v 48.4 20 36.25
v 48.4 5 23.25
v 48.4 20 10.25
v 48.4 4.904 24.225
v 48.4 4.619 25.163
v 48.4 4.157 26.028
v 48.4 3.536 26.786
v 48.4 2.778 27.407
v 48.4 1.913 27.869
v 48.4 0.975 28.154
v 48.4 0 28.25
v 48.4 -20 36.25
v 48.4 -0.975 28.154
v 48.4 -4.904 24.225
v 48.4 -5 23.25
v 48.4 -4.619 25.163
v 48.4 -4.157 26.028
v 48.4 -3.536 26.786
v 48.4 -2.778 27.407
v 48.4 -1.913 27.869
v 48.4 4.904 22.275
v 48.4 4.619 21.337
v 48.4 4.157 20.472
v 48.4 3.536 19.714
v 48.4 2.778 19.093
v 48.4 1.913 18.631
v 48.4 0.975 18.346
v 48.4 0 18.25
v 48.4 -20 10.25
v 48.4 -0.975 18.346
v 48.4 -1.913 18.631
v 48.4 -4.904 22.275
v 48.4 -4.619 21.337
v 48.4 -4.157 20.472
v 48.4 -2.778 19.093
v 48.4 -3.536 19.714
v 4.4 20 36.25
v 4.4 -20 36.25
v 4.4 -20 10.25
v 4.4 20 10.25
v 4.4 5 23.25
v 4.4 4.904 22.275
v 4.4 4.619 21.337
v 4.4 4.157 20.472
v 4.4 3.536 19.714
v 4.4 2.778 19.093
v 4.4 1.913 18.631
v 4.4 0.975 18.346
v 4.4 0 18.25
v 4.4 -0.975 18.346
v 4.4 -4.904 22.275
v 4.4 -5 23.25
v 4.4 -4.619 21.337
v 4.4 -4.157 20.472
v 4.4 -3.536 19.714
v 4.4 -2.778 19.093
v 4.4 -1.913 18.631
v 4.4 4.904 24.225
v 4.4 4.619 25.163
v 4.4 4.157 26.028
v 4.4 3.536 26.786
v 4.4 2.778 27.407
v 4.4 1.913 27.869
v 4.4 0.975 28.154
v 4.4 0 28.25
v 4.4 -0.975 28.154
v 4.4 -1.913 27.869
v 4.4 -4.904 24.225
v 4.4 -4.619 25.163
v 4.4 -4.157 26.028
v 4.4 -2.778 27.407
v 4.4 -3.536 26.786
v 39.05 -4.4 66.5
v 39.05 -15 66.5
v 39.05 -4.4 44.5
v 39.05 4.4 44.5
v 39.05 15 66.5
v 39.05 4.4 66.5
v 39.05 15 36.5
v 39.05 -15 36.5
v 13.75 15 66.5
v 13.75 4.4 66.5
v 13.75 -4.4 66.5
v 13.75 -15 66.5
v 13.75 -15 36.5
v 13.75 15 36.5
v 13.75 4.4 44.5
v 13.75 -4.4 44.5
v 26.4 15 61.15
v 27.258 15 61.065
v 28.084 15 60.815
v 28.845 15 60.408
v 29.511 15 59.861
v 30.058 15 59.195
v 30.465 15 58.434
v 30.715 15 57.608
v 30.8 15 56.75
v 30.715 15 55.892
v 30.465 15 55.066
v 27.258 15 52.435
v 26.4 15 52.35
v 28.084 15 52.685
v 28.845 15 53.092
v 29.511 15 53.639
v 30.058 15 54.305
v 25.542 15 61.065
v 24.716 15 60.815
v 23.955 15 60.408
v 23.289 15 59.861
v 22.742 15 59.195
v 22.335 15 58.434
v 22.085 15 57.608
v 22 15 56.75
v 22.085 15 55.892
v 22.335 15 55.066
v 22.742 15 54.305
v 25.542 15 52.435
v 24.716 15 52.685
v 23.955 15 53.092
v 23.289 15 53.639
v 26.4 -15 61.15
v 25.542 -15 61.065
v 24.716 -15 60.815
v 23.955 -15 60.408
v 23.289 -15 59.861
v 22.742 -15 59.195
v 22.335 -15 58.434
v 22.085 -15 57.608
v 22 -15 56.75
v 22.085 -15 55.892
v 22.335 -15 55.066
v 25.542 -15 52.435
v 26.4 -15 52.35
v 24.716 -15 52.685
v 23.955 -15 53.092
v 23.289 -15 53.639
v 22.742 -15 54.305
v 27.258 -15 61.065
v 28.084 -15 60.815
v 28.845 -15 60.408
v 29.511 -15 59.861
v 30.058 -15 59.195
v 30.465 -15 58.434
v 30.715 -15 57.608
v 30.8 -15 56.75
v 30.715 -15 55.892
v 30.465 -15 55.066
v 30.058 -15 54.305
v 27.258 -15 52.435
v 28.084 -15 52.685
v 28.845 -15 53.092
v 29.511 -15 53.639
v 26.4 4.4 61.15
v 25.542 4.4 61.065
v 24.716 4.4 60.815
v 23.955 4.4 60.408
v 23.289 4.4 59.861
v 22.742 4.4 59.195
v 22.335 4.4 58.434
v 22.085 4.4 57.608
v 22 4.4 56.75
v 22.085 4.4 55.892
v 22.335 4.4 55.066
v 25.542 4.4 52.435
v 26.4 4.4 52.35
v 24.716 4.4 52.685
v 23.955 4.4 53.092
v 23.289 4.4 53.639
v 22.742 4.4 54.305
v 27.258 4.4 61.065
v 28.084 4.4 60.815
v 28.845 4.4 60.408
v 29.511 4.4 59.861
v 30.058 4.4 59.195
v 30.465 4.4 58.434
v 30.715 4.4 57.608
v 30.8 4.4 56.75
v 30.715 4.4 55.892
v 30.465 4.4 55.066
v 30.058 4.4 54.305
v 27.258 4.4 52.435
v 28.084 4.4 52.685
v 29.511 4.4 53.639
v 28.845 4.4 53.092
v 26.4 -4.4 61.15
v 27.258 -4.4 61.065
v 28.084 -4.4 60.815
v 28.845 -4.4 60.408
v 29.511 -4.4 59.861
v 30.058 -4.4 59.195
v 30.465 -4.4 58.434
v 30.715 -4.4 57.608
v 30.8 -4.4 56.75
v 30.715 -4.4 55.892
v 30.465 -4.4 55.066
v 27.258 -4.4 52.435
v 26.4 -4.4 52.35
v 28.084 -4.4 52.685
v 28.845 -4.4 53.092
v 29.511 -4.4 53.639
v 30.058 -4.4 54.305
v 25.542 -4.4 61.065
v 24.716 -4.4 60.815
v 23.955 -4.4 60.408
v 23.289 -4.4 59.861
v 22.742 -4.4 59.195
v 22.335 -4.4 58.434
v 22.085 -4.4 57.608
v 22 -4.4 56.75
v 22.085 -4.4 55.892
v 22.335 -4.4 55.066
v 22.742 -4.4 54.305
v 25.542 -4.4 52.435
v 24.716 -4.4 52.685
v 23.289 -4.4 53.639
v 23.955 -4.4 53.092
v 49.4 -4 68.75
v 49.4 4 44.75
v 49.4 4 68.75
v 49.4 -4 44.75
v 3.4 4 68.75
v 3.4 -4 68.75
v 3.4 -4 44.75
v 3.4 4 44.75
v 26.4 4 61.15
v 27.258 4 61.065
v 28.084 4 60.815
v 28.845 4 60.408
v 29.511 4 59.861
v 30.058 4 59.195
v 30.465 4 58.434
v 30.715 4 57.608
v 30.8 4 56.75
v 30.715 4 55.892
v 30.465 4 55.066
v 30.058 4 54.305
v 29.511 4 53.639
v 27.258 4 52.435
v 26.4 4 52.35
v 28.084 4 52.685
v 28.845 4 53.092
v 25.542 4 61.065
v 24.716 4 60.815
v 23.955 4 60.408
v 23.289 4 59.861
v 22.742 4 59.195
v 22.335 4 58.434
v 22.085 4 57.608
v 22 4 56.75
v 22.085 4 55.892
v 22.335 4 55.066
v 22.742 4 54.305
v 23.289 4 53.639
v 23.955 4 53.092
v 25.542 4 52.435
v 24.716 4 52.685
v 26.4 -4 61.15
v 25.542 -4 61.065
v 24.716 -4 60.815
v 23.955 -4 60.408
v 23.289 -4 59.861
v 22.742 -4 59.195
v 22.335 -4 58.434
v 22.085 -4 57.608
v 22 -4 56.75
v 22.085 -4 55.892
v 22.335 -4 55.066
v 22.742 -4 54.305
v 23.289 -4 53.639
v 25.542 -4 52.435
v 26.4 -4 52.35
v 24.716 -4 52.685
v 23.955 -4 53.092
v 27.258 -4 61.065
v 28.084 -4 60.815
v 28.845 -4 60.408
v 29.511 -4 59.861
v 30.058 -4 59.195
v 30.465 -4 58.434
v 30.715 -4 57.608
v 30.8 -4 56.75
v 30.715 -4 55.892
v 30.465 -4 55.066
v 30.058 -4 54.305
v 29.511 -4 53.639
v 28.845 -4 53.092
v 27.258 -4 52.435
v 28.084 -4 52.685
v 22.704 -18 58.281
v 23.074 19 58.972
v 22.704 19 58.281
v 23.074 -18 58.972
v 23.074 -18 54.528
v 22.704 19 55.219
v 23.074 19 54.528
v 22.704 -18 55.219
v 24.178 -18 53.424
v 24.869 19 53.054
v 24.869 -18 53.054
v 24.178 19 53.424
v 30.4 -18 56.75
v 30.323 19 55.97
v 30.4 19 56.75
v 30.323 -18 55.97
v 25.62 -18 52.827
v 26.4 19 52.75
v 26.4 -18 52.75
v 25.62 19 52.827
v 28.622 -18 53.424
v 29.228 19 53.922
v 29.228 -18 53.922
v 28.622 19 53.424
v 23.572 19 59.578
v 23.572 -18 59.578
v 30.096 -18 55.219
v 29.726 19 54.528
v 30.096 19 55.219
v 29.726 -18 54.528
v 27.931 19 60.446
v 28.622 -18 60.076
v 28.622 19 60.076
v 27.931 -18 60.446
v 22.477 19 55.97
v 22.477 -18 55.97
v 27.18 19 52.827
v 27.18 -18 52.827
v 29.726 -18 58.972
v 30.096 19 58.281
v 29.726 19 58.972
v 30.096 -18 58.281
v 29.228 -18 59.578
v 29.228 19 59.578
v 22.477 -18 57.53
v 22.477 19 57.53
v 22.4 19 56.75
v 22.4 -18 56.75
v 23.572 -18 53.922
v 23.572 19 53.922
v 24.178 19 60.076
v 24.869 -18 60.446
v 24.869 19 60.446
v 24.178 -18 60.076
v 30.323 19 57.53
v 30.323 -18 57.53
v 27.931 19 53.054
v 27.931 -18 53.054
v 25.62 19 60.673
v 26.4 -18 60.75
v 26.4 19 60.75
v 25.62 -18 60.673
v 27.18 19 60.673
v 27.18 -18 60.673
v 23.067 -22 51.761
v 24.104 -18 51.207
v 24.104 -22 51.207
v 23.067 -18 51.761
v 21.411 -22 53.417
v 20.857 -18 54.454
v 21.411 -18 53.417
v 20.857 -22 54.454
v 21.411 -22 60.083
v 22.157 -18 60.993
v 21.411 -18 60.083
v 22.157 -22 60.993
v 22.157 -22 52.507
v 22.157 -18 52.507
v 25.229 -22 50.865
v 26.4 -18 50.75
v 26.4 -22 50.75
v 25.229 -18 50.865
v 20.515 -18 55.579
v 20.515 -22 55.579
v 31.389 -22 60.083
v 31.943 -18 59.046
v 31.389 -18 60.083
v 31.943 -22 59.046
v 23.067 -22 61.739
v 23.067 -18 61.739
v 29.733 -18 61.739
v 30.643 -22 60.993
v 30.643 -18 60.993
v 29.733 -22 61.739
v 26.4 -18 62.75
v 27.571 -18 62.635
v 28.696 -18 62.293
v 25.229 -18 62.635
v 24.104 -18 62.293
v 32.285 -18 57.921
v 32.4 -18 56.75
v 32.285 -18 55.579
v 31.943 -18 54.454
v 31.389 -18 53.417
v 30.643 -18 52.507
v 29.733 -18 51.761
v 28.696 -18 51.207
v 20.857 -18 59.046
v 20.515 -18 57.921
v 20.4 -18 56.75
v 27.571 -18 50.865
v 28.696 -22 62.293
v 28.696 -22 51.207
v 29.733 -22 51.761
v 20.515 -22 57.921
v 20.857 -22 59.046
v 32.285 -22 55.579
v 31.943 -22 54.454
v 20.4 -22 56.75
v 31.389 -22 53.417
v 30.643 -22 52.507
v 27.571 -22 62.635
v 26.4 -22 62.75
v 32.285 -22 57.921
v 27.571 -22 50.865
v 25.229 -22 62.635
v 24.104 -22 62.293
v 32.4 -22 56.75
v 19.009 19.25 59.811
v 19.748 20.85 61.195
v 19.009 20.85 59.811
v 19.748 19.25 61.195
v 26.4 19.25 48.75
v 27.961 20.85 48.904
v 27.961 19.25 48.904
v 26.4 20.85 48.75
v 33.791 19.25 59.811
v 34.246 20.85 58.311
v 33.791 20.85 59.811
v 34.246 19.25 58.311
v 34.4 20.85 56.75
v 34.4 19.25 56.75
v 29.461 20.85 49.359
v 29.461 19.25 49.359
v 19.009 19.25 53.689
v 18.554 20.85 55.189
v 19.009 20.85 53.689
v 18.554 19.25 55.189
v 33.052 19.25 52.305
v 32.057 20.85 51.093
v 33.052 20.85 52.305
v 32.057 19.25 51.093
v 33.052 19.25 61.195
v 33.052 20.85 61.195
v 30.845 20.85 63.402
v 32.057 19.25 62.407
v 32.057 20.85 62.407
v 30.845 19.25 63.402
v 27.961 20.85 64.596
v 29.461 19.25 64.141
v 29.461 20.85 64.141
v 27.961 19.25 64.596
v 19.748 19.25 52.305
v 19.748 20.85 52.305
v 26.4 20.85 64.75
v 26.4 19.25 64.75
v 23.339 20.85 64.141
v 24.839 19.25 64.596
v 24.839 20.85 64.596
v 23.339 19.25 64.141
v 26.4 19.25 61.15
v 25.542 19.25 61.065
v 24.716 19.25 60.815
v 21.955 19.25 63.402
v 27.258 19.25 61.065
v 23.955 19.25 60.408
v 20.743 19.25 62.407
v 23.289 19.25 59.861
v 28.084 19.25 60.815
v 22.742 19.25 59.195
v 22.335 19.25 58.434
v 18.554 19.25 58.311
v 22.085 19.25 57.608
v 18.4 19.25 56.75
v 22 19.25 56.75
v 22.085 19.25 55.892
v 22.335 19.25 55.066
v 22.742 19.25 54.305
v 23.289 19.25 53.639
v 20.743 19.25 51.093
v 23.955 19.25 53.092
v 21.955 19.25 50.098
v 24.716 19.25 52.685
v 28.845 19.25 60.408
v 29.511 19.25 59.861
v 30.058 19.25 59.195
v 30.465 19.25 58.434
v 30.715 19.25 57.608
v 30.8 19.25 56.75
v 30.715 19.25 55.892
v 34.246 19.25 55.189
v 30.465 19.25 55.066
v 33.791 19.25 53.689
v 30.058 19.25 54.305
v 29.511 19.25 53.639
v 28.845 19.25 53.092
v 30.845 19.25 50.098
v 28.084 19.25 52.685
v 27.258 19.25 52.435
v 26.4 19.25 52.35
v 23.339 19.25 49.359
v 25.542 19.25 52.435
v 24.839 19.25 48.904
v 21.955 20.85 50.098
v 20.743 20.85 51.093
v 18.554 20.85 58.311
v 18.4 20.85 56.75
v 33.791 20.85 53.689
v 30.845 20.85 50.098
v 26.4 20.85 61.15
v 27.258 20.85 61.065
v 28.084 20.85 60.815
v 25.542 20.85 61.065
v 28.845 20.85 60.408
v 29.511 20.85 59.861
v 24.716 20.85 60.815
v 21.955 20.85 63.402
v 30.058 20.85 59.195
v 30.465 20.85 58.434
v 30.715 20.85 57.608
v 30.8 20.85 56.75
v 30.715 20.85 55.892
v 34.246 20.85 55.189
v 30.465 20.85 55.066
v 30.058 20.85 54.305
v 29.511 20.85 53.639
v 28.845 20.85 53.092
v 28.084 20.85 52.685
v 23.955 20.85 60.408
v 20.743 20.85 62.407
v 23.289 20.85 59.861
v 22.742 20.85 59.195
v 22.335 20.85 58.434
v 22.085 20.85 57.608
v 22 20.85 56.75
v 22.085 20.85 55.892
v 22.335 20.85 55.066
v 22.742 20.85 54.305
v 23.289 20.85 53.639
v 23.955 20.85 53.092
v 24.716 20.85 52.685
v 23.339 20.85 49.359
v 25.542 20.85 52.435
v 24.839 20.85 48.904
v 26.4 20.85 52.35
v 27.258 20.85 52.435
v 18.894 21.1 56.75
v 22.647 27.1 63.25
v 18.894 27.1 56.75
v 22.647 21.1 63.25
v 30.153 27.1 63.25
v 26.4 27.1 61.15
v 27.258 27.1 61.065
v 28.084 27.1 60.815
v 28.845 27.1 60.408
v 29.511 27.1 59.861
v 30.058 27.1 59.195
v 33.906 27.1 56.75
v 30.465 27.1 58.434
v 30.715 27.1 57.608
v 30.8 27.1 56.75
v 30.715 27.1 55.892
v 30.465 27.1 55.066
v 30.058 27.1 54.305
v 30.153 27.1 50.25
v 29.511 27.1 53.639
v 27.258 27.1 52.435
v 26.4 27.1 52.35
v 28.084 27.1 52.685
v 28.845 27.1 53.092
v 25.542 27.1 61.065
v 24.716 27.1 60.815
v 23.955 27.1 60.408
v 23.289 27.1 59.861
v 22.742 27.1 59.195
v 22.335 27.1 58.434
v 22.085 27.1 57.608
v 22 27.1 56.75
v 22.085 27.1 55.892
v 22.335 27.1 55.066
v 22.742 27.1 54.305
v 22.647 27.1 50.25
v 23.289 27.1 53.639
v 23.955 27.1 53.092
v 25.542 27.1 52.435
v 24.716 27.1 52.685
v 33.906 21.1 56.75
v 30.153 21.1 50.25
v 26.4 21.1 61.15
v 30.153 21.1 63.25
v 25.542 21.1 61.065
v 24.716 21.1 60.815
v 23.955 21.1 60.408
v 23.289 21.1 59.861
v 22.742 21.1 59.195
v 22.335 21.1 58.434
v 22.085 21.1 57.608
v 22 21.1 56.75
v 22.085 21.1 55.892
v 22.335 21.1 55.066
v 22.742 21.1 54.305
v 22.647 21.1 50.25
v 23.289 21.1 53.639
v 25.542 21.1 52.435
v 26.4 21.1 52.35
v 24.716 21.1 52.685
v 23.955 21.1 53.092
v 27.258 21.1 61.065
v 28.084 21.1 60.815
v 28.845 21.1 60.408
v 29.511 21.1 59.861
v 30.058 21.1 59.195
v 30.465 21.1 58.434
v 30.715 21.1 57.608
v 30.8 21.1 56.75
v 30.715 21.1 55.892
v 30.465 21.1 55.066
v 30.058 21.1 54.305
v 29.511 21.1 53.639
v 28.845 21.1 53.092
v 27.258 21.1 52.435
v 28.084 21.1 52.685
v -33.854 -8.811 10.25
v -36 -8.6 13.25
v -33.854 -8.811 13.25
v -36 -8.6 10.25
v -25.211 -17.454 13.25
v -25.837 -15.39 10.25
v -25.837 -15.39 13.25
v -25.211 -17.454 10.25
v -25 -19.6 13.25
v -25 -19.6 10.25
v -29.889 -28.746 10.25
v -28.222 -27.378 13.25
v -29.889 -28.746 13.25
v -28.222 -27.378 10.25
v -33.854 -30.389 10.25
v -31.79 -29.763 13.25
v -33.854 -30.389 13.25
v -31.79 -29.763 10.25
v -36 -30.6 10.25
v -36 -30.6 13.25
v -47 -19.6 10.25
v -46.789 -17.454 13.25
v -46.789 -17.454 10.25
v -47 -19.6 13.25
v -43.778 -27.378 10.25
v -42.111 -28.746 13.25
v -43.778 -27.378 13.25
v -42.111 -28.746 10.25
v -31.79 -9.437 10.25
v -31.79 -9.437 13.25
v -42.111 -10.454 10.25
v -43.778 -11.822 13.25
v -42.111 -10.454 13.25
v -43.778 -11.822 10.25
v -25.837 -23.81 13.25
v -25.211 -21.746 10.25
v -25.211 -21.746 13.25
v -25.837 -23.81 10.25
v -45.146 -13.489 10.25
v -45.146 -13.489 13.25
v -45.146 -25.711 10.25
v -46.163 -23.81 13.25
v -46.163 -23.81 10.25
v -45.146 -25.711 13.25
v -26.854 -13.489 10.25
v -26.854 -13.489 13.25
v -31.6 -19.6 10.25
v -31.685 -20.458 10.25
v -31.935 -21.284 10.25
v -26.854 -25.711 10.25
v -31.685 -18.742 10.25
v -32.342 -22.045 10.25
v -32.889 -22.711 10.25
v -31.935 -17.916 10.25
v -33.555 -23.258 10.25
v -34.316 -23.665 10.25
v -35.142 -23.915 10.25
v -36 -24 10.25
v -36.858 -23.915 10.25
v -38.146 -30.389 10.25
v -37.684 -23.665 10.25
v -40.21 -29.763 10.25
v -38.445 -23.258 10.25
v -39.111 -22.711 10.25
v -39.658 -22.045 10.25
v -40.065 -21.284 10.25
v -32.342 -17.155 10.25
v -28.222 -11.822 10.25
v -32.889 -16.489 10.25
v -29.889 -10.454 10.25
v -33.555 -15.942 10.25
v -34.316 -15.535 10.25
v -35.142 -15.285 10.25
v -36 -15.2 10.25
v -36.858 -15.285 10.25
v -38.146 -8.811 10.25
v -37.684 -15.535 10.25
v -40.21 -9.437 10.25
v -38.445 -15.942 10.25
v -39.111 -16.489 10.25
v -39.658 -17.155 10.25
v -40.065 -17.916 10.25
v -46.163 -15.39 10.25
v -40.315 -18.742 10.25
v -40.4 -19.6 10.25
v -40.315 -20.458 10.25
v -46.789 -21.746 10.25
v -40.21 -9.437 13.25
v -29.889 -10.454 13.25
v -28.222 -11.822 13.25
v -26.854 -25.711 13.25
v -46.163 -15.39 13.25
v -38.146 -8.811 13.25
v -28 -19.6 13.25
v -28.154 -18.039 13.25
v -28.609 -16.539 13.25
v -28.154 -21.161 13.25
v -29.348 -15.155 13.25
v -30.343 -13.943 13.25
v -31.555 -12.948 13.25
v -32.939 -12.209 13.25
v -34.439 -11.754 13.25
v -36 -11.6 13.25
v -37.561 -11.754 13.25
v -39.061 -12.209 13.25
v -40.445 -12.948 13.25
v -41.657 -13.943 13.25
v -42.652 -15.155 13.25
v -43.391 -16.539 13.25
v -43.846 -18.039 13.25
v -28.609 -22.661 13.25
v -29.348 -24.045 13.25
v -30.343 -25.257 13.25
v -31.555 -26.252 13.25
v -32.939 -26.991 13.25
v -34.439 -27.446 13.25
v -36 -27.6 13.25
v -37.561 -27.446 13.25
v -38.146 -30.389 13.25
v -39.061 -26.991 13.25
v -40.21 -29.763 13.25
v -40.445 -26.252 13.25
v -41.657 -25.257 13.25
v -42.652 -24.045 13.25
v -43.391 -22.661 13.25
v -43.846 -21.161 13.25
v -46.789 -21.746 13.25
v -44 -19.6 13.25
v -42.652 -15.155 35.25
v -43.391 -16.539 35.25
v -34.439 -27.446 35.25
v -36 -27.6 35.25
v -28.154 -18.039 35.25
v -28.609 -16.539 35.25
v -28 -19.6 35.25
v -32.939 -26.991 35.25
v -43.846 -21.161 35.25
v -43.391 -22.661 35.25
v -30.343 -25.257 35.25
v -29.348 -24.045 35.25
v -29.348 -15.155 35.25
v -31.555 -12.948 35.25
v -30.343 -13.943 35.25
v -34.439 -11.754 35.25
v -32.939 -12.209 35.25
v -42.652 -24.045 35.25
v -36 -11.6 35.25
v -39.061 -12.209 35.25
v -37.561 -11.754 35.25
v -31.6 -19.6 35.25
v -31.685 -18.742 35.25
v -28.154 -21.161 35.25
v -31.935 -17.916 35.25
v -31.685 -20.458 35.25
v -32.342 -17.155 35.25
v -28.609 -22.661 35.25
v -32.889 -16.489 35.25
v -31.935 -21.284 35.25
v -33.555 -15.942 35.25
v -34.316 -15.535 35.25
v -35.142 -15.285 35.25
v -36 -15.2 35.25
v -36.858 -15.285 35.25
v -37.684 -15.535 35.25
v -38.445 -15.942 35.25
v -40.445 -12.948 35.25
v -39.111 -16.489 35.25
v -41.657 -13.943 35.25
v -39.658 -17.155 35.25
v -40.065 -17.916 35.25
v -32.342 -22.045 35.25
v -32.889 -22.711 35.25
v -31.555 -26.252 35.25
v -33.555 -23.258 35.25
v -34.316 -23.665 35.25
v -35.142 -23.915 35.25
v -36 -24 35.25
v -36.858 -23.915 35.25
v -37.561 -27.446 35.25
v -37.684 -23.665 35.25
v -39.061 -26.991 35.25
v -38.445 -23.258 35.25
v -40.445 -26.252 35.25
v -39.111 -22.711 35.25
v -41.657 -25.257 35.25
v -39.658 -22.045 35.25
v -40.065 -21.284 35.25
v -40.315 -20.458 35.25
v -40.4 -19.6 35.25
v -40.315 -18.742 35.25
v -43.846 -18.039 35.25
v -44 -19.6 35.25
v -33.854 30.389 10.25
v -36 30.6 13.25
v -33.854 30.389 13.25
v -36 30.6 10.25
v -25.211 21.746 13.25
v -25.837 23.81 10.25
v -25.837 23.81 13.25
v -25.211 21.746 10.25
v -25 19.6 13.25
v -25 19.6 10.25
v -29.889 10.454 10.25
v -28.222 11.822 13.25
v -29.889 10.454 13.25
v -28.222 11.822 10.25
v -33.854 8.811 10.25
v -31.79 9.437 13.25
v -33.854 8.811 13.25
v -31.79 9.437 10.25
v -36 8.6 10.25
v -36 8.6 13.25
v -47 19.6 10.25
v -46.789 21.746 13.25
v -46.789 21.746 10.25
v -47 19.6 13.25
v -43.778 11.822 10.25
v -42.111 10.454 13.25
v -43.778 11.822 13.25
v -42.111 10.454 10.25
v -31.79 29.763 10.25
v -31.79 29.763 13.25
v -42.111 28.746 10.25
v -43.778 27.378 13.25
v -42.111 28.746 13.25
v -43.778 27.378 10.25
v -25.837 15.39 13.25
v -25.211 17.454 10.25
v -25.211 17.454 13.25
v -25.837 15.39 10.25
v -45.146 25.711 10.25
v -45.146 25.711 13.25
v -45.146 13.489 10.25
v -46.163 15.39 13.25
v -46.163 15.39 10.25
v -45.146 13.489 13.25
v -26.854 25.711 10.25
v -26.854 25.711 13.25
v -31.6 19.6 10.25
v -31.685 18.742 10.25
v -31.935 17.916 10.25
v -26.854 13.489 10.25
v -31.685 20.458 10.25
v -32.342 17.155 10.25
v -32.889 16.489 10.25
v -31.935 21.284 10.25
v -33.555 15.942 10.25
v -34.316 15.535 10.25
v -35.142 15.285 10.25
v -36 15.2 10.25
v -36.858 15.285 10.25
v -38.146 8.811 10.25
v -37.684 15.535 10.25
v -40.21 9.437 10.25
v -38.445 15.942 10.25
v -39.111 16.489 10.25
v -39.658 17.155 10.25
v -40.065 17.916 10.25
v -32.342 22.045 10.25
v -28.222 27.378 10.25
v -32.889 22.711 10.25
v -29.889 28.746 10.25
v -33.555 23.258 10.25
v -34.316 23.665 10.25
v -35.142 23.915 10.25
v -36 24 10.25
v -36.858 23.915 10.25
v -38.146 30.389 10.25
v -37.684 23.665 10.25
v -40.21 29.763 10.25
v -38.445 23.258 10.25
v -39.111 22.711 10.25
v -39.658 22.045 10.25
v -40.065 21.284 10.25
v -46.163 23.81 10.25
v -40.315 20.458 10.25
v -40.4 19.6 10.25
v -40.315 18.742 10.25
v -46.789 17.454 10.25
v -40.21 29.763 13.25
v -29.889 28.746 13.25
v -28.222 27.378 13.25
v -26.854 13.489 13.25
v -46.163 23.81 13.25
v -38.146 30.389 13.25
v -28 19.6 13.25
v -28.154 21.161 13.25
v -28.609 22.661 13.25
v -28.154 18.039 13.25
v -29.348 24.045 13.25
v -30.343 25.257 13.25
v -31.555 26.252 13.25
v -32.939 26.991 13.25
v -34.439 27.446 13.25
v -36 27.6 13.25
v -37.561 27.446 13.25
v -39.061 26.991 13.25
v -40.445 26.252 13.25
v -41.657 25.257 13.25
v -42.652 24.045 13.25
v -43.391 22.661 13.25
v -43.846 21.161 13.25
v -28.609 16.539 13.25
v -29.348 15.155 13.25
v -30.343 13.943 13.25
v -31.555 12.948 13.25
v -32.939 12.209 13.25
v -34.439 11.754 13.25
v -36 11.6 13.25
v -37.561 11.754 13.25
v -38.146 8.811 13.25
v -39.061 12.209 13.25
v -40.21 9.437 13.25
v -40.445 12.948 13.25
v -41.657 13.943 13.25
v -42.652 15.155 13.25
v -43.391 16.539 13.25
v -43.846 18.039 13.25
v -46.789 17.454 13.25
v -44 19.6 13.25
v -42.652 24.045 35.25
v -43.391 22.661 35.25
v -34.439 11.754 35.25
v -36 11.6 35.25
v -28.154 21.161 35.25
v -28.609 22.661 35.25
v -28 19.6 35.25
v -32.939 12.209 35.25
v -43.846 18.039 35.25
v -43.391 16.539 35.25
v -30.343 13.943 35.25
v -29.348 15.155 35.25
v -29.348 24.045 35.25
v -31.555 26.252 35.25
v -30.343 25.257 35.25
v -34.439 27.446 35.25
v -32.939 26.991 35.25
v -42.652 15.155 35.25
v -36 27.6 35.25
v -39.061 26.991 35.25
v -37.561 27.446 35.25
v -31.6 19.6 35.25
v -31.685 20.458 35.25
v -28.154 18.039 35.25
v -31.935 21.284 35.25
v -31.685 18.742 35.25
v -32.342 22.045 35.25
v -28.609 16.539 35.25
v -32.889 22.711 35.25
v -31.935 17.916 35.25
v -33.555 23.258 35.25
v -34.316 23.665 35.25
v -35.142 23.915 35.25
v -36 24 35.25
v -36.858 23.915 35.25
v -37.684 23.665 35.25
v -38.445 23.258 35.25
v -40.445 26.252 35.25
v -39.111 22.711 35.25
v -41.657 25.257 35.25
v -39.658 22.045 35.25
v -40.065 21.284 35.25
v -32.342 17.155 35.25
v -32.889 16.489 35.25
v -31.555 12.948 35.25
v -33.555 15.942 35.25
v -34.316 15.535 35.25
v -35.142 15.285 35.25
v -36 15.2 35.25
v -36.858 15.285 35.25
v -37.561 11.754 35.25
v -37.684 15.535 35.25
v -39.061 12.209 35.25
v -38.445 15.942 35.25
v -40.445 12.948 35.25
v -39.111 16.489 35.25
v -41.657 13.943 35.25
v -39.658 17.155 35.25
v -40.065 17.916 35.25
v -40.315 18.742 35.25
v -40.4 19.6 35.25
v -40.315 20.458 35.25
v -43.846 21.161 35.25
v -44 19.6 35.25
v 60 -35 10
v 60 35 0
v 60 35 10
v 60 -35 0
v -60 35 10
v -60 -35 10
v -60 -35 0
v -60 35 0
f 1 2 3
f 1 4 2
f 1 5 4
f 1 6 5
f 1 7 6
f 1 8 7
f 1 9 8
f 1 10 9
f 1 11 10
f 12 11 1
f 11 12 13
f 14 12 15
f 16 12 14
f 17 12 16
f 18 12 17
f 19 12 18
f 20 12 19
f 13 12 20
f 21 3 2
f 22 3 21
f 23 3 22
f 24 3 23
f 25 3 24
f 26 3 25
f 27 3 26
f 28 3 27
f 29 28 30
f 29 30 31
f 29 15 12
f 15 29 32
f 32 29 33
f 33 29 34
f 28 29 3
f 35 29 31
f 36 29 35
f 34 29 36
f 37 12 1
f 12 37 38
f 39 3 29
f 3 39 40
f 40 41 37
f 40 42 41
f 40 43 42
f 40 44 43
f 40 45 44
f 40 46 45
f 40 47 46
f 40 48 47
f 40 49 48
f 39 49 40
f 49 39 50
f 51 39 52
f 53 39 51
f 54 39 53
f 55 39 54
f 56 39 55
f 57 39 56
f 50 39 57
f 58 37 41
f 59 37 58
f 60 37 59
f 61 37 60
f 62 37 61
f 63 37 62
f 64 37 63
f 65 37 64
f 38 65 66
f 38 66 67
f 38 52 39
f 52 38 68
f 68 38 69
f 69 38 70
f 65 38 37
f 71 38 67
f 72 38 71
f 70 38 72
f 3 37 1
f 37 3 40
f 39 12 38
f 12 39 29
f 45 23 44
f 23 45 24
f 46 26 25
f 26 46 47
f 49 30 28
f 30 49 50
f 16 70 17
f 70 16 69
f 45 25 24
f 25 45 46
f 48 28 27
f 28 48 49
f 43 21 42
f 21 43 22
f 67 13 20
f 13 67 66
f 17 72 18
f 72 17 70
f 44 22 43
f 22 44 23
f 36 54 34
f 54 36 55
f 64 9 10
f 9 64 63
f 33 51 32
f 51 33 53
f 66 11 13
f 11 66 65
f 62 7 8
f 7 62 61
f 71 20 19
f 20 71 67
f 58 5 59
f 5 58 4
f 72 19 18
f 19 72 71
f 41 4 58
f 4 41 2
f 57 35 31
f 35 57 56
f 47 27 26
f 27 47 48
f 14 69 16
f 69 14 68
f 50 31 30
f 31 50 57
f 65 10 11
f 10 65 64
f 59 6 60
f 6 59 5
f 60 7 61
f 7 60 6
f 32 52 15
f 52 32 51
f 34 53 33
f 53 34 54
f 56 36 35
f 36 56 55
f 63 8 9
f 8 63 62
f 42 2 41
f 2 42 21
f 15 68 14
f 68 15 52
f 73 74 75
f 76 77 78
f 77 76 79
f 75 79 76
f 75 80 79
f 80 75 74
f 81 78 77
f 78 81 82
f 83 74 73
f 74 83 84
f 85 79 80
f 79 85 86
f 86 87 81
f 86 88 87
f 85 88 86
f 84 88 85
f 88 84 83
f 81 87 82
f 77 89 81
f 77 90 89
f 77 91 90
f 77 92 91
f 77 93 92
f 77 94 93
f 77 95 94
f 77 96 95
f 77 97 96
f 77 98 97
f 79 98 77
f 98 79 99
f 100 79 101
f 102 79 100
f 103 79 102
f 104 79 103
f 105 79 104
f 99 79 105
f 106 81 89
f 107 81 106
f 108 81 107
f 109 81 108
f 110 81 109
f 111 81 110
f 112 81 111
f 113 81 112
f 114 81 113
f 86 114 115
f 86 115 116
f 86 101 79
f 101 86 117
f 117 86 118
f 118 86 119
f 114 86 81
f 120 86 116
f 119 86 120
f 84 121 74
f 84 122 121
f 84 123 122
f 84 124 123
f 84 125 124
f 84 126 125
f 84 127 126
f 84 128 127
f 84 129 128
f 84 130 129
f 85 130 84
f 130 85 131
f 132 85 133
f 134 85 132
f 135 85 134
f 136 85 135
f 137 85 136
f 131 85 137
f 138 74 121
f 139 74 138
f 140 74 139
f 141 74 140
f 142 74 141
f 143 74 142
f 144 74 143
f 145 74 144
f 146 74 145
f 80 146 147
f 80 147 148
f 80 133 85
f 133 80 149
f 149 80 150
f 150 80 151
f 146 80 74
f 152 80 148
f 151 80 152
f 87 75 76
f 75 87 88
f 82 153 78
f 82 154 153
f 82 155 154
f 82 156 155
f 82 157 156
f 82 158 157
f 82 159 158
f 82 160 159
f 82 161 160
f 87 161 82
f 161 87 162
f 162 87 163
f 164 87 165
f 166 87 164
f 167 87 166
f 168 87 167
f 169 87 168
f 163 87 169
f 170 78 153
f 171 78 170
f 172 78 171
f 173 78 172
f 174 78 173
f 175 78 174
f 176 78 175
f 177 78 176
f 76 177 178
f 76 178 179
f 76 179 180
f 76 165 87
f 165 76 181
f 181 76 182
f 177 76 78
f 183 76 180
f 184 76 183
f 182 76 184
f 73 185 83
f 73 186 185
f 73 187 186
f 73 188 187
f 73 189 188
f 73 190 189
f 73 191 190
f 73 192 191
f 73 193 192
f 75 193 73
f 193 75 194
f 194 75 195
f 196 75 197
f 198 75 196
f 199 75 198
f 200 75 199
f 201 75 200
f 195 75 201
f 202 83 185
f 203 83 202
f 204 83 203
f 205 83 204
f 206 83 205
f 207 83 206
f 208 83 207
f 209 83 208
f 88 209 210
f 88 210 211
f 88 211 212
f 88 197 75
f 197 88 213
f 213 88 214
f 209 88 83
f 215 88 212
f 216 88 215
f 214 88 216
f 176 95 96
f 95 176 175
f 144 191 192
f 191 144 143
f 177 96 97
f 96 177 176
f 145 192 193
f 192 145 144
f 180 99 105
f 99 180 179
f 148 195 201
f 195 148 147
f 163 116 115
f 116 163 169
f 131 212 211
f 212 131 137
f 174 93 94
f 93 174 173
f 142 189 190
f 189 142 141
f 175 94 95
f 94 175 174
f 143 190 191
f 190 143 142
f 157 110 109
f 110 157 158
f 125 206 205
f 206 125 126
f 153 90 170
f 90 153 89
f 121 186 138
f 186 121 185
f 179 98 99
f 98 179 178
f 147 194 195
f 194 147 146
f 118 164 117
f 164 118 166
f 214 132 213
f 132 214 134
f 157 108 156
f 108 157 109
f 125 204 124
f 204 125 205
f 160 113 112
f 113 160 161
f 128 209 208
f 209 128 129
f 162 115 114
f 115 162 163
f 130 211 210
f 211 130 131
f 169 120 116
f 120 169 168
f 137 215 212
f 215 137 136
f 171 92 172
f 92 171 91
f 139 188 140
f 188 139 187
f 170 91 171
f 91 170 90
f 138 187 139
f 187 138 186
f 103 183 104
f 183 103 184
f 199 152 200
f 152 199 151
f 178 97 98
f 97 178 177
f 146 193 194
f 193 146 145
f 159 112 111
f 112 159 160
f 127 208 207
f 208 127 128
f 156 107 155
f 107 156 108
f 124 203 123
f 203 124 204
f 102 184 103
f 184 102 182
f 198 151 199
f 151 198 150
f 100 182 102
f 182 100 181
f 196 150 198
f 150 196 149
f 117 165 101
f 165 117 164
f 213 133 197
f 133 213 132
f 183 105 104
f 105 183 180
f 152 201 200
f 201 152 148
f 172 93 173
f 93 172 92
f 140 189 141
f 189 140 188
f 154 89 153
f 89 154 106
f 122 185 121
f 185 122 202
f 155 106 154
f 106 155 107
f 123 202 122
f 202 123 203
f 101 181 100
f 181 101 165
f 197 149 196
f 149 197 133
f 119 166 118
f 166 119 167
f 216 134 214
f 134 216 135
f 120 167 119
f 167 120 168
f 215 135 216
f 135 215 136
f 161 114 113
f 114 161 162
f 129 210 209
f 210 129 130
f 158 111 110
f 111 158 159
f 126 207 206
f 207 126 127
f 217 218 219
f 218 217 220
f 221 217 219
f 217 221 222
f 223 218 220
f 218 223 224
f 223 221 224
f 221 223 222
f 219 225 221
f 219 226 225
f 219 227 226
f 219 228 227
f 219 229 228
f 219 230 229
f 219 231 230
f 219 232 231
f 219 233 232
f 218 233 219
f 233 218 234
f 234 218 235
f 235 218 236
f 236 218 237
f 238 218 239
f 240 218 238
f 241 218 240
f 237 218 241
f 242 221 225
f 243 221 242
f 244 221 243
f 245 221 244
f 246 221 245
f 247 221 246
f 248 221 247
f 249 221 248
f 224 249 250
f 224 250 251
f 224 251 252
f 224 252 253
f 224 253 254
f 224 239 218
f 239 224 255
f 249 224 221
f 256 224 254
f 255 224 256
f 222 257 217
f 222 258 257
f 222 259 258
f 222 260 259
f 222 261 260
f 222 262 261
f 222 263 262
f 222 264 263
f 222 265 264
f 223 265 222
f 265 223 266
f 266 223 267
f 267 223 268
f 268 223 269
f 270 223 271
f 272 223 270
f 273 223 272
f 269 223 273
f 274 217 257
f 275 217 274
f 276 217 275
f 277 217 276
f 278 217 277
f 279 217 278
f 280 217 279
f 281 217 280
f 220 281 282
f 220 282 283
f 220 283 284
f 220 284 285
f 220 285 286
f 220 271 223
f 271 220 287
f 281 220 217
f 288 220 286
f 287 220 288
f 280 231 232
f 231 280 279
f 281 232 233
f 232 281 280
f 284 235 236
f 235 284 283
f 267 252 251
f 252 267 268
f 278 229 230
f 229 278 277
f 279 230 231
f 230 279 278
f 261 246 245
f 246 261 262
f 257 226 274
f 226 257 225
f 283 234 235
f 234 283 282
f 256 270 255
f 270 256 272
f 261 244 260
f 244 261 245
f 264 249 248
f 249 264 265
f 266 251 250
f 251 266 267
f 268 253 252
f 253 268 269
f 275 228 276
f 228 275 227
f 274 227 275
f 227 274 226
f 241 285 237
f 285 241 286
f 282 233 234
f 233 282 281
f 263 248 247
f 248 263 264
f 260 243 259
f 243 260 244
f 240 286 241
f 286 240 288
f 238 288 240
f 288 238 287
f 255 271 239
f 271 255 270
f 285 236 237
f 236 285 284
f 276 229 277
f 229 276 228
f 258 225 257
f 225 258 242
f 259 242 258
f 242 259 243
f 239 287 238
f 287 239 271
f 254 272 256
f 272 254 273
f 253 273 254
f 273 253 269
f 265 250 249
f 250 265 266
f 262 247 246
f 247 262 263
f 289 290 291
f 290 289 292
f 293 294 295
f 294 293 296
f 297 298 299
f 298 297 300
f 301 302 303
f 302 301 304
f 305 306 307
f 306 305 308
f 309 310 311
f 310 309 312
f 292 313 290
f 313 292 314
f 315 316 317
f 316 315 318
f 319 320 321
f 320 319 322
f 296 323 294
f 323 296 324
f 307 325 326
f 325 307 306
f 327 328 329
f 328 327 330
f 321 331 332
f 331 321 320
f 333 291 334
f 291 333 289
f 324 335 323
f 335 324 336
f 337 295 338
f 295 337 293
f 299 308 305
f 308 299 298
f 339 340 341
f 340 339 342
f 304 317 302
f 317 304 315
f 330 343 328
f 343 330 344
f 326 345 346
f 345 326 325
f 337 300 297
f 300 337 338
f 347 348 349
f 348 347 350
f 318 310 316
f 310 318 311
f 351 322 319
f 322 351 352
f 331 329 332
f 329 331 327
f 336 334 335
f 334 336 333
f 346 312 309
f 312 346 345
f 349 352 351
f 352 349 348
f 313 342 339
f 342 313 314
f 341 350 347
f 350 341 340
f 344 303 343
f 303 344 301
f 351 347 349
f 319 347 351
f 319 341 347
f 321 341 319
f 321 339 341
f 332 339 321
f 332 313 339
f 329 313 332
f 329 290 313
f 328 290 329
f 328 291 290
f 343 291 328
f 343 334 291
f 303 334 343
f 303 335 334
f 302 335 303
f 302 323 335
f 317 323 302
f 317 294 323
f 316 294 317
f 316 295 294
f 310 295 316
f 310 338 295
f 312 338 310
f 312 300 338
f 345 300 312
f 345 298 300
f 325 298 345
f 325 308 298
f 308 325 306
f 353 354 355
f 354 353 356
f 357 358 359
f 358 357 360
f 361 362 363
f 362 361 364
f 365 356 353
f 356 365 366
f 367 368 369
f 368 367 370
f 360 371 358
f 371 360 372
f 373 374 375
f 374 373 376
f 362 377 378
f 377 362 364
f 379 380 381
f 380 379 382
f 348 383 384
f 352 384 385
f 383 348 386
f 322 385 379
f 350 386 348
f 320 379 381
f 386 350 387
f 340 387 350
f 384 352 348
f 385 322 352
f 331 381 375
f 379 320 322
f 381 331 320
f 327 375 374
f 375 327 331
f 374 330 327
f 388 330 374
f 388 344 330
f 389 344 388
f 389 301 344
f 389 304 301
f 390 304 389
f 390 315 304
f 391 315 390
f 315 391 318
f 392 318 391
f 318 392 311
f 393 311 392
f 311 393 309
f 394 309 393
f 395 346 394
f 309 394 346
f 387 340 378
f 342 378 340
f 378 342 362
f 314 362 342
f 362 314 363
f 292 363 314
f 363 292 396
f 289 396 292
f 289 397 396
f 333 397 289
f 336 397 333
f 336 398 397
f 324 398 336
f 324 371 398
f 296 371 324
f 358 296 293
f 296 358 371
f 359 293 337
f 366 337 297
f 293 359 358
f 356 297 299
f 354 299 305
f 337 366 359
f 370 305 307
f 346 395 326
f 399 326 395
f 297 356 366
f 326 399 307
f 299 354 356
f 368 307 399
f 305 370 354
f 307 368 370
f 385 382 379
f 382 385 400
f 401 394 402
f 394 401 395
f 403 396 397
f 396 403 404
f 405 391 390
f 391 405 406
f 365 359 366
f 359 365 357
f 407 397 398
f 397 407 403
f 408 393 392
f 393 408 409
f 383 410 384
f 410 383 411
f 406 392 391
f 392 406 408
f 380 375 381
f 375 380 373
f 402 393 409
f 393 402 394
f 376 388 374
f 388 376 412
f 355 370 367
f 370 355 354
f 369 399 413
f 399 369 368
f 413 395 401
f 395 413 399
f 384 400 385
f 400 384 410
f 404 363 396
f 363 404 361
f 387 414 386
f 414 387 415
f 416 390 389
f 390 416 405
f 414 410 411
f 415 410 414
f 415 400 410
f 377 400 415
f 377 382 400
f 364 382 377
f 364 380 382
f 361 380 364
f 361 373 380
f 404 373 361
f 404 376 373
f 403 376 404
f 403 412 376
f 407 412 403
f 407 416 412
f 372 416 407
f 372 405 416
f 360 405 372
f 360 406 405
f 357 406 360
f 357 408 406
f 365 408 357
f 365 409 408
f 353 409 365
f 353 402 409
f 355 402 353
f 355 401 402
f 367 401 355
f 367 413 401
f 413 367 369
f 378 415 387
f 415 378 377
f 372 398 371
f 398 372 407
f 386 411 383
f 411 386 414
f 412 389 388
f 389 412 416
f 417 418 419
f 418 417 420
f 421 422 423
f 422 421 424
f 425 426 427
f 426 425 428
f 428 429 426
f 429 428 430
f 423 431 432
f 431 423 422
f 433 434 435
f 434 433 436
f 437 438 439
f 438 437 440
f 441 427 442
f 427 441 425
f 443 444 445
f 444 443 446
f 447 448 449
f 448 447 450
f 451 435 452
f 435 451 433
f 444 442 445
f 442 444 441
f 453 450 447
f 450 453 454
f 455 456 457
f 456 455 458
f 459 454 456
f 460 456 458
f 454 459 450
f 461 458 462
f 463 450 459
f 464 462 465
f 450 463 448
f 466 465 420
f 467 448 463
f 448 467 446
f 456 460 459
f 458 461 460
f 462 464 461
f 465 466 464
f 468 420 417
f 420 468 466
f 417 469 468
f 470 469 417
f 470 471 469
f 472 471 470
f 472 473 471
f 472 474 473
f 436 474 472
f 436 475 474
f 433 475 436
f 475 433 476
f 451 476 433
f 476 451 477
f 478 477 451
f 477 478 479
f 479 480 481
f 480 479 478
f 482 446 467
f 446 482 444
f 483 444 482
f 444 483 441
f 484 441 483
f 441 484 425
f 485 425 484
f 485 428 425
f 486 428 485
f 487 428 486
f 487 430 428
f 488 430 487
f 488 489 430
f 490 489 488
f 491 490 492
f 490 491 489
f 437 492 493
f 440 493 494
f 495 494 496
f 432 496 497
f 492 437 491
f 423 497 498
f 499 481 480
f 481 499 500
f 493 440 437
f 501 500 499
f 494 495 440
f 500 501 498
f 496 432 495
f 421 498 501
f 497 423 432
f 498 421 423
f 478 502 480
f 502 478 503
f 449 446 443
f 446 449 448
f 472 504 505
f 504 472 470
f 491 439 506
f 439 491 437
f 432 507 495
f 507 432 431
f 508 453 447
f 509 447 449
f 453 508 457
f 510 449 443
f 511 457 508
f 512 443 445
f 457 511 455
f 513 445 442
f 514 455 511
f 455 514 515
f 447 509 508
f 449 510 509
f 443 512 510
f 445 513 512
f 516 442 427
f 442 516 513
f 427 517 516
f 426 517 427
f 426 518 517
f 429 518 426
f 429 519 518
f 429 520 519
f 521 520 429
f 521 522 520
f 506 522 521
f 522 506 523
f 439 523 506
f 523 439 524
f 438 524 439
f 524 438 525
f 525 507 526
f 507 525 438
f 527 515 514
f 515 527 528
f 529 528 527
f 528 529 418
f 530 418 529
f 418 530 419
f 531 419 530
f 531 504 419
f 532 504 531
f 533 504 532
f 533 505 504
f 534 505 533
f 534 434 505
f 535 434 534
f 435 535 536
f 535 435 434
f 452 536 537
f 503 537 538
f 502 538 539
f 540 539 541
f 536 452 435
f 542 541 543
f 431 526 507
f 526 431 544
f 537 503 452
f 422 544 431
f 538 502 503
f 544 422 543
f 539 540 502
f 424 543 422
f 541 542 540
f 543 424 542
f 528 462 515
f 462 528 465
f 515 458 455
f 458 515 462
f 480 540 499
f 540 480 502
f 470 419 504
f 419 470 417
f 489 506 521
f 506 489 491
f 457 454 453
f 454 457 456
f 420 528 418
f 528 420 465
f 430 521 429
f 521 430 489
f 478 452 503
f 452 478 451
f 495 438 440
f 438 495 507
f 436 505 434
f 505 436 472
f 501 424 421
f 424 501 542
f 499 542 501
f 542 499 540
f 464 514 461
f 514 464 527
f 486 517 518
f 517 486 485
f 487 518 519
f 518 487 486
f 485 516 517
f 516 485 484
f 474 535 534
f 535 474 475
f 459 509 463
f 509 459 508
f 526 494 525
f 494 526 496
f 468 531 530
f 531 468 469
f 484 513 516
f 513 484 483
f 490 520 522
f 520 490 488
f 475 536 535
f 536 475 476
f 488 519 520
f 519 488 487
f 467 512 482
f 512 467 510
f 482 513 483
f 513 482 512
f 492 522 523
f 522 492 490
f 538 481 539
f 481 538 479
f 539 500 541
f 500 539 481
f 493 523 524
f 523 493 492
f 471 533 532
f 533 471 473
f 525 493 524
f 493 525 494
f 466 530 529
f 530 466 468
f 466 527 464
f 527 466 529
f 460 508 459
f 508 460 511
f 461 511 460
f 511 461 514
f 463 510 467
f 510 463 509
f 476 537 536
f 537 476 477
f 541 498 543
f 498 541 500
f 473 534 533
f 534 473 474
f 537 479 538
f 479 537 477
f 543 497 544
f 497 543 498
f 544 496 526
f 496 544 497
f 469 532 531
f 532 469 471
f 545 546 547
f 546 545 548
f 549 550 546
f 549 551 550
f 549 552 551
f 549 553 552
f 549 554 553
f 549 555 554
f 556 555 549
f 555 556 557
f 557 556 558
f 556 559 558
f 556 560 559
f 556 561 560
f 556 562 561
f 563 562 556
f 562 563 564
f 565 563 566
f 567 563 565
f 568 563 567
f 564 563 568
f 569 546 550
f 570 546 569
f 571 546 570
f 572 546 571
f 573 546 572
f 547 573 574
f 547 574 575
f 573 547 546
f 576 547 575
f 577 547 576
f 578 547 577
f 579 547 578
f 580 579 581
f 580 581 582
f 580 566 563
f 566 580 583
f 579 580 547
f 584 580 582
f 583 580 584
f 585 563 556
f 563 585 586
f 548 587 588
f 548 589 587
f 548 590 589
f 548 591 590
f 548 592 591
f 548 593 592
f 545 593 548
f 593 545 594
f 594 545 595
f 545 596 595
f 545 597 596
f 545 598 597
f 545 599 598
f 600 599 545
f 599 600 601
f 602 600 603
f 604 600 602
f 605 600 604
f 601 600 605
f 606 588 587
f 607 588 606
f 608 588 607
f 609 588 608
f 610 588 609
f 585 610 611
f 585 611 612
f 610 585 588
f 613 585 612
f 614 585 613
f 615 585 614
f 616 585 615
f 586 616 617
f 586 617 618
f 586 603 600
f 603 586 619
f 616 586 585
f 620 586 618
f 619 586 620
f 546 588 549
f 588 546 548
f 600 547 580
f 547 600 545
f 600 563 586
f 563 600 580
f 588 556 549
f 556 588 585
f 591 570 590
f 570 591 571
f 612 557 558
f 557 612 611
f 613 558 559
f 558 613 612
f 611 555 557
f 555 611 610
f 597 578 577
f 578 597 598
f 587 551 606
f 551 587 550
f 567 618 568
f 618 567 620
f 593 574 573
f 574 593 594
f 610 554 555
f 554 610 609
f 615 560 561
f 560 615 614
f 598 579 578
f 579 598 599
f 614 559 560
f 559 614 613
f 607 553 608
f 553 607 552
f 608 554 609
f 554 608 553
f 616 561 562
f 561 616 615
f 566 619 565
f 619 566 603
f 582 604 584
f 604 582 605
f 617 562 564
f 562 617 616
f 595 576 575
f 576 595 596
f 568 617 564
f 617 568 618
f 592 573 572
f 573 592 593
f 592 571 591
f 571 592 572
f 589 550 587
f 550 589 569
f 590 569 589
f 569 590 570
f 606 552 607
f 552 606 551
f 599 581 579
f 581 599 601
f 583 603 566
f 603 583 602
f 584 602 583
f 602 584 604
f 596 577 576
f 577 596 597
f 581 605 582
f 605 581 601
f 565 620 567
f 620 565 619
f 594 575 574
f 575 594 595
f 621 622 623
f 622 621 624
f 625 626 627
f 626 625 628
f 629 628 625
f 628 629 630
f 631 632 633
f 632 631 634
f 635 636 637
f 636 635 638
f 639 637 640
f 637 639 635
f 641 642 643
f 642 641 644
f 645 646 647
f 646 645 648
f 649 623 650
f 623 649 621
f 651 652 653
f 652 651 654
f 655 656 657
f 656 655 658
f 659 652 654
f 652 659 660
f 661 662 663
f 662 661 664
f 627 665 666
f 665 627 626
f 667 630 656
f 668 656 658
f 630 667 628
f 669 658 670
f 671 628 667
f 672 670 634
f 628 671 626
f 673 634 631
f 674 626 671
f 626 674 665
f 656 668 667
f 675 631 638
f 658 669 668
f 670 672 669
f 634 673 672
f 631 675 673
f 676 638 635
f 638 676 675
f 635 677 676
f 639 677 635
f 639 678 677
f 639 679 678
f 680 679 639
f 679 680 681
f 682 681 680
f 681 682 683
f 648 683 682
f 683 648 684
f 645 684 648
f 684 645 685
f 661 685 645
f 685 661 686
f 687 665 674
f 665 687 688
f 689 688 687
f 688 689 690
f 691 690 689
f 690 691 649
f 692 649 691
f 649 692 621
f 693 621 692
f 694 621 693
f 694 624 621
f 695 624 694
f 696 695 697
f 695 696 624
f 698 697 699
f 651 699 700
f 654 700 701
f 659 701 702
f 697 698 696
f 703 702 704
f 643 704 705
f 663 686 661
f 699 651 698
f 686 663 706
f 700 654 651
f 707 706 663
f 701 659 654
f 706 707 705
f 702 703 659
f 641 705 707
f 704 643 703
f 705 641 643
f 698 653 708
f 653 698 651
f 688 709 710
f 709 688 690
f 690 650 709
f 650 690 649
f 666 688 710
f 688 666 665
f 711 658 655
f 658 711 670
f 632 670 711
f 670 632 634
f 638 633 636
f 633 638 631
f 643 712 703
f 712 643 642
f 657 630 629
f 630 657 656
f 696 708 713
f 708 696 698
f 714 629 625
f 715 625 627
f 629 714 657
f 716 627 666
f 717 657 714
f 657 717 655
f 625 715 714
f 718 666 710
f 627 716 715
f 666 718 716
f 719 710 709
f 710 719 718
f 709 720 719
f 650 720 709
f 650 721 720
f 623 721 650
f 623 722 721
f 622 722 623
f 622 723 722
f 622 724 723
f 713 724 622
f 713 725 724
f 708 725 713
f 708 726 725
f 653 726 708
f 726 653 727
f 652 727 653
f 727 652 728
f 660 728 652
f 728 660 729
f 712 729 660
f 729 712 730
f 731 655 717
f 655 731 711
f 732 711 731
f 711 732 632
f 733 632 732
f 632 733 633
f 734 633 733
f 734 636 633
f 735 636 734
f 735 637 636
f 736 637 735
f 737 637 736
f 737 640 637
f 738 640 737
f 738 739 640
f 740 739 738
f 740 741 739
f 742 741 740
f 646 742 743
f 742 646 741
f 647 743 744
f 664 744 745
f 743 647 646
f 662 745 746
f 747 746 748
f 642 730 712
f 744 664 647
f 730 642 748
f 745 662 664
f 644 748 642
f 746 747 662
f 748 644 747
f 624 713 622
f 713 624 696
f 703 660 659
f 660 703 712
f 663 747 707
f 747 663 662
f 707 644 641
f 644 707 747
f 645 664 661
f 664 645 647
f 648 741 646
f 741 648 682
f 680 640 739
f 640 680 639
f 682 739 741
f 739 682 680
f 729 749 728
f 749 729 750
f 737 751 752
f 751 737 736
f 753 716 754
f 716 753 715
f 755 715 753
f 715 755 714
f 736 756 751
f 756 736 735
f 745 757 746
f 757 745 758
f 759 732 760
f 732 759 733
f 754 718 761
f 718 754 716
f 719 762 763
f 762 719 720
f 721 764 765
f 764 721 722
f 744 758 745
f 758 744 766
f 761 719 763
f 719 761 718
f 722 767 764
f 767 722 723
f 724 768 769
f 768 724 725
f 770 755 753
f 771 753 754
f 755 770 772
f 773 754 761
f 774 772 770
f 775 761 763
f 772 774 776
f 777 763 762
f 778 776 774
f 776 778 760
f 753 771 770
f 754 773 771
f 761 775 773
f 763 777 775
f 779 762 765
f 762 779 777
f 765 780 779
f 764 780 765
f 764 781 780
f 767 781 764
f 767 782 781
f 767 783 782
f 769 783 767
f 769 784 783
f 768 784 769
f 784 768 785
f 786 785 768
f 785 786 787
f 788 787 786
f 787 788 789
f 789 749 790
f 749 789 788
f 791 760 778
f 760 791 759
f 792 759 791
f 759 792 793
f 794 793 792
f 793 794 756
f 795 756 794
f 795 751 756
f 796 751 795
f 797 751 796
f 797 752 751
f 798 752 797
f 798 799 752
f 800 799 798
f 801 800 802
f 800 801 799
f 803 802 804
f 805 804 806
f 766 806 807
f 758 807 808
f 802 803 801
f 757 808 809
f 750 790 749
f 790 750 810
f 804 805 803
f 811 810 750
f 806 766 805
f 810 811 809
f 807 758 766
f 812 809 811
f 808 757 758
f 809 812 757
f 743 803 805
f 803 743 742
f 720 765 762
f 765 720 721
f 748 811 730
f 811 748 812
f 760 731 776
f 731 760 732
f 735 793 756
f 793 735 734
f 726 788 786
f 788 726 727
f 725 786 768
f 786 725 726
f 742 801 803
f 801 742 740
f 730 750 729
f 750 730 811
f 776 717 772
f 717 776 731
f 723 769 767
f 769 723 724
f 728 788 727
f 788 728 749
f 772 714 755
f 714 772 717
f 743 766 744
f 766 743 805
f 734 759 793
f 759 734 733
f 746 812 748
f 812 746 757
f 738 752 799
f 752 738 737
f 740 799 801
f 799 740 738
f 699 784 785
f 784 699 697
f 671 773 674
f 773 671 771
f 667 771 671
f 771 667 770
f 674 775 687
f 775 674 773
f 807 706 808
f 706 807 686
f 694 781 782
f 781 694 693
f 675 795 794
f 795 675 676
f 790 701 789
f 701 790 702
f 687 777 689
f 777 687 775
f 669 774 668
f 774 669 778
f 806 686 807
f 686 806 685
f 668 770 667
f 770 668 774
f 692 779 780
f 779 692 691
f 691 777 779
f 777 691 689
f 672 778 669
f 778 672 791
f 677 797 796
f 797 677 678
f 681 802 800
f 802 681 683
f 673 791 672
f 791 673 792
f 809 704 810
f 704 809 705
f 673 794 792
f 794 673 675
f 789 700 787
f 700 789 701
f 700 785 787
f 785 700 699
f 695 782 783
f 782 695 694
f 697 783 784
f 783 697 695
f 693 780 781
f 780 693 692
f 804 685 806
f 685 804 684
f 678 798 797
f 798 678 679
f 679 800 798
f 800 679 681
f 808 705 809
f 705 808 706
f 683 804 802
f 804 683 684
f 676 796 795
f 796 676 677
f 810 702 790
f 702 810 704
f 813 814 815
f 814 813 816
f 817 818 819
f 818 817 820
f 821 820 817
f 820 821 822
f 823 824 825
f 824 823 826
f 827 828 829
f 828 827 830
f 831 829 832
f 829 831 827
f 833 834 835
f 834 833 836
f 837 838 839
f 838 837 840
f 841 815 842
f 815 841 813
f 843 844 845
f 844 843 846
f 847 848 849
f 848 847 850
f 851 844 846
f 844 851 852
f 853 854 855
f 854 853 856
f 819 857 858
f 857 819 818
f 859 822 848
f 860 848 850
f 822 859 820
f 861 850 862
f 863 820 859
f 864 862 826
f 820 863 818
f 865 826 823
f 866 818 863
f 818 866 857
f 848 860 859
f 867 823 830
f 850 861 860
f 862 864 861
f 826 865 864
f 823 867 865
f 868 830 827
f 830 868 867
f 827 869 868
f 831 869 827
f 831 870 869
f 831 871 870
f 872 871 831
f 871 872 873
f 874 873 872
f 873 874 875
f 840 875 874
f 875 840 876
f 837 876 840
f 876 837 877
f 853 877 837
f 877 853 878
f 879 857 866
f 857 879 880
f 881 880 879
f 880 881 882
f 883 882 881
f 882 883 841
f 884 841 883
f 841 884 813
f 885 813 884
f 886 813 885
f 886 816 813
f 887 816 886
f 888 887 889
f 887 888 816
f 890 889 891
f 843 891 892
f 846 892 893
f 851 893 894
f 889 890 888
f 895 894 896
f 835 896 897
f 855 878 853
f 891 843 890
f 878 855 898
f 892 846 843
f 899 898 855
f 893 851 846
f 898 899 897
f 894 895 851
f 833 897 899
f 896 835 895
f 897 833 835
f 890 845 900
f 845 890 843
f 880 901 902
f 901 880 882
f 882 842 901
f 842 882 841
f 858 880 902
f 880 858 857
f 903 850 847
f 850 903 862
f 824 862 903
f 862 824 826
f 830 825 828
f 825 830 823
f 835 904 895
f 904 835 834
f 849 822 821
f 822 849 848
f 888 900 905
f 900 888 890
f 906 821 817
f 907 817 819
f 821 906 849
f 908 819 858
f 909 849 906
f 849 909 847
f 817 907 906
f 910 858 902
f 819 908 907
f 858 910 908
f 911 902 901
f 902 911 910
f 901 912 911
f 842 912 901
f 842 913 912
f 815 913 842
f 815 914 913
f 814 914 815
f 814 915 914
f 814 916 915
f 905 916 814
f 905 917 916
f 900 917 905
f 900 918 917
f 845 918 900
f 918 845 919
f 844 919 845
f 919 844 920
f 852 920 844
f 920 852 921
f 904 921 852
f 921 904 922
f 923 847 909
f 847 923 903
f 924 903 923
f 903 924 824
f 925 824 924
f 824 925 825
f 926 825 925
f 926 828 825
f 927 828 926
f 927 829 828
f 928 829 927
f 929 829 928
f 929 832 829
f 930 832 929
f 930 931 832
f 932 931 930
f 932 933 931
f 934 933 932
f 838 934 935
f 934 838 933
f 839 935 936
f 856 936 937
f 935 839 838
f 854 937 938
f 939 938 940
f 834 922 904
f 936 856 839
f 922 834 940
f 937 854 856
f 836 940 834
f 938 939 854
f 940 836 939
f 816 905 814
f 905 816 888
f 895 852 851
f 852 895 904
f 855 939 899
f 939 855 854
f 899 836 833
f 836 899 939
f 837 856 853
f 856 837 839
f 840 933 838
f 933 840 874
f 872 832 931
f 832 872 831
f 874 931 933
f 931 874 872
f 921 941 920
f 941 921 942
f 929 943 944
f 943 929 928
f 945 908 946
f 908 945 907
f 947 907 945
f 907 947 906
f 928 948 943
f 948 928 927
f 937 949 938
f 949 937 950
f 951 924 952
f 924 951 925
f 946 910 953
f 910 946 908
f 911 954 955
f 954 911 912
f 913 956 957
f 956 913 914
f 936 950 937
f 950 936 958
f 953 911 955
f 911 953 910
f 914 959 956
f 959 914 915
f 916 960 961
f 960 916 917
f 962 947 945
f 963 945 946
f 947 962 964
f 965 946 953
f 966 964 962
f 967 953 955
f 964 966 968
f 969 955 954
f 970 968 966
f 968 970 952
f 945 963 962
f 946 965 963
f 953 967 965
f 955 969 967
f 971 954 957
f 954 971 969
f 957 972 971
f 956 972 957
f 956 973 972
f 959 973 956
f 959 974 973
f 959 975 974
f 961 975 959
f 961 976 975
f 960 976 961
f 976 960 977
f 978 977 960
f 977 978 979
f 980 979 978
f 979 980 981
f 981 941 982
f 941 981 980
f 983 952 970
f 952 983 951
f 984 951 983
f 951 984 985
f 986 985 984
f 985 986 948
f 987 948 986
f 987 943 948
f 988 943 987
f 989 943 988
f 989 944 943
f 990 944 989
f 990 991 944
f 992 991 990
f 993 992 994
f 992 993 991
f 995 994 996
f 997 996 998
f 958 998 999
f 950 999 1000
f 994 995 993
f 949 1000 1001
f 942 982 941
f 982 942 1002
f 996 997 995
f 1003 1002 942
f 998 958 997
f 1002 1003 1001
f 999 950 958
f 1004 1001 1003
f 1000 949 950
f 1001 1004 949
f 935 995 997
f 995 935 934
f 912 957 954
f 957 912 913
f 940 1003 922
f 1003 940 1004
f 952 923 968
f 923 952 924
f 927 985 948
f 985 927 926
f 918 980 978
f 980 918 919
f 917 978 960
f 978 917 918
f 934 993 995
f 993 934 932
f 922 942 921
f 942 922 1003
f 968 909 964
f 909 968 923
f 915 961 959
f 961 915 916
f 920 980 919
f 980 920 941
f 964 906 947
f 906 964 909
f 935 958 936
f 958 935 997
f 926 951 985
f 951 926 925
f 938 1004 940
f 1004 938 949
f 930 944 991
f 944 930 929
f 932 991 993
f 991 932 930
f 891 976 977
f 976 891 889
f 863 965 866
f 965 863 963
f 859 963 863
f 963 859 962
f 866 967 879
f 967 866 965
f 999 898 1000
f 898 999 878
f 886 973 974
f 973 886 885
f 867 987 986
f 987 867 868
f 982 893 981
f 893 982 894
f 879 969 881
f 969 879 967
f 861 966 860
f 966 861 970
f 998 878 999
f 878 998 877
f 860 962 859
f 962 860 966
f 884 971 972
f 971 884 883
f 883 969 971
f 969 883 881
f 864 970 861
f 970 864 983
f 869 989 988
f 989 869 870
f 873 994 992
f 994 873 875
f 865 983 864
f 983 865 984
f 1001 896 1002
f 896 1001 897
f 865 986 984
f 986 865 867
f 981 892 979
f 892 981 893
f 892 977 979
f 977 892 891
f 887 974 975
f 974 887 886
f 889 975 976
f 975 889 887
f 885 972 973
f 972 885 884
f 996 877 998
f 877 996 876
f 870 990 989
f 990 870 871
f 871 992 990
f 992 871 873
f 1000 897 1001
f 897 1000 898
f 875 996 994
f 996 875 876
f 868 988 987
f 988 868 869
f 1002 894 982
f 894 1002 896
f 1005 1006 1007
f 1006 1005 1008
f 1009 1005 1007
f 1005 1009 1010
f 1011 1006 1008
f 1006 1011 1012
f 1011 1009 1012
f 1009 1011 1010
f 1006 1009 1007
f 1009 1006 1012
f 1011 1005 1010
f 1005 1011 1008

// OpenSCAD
$fn = 32;

// ------------------------------------------------------------------------
// Indexing jig: plate 120 x 70 mm, pin d8
// Every part is its own module, assembly() places every instance.
// ------------------------------------------------------------------------

// --- part 1 ---
module jig_plate() {
  difference() {
    translate([-60, -35, 0]) cube([120, 70, 10]);
  }
}

// --- part 2 ---
module locator_block() {
  difference() {
    translate([-22, -20, 0]) cube([44, 40, 26]);
    translate([0, 0, 13]) rotate([0, 90, 0]) cylinder(h = 46, d = 10, center = true);
  }
}

// --- part 3 ---
module index_fork() {
  difference() {
    translate([-12.65, -15, 0]) cube([25.3, 30, 30]);
    translate([-13.65, -4.4, 8]) cube([27.3, 8.8, 23]);
    translate([0, 0, 20.25]) rotate([90, 0, 0]) cylinder(h = 32, d = 8.8, center = true);
  }
}

// --- part 4 ---
module index_arm() {
  difference() {
    translate([-23, -4, 0]) cube([46, 8, 24]);
    translate([0, 0, 12]) rotate([90, 0, 0]) cylinder(h = 10, d = 8.8, center = true);
  }
}

// --- part 5 ---
module index_pin() {
  rotate([0, 90, 0]) cylinder(h = 38, d = 8, center = true);
  translate([-22, 0, 0]) rotate([0, 90, 0]) cylinder(h = 4, d = 12);
}

// --- part 6 ---
module pin_washer() {
  difference() {
      translate([0, 0, 0]) cylinder(h = 1.6, d = 16);
      translate([0, 0, -1]) cylinder(h = 3.6, d = 8.8);
    }
}

// --- part 7 ---
module lock_nut() {
  difference() {
    linear_extrude(height = 6) polygon(points = [[7.506, 0], [3.753, 6.5], [-3.753, 6.5], [-7.506, 0], [-3.753, -6.5], [3.753, -6.5]]);
    translate([0, 0, -1]) cylinder(h = 8, d = 8.8);
  }
}

// --- part 8 ---
module guide_bush_a() {
  difference() {
    union() {
      cylinder(h = 3, d = 22);
      translate([0, 0, 3]) cylinder(h = 22, d = 16);
    }
    translate([0, 0, -1]) cylinder(h = 27, d = 8.8);
  }
}

// --- part 9 ---
module guide_bush_b() {
  difference() {
    union() {
      cylinder(h = 3, d = 22);
      translate([0, 0, 3]) cylinder(h = 22, d = 16);
    }
    translate([0, 0, -1]) cylinder(h = 27, d = 8.8);
  }
}

// --- assembly ---
module assembly() {
  color([0.80, 0.24, 0.20]) translate([0, 0, 0]) rotate([0, 0, 0]) jig_plate();
  color([0.20, 0.45, 0.75]) translate([26.4, 0, 10.25]) rotate([0, 0, 0]) locator_block();
  color([0.25, 0.62, 0.32]) translate([26.4, 0, 36.5]) rotate([0, 0, 0]) index_fork();
  color([0.92, 0.70, 0.18]) translate([26.4, 0, 44.75]) rotate([0, 0, 0]) index_arm();
  color([0.58, 0.35, 0.70]) translate([26.4, 0, 56.75]) rotate([0, 0, 90]) index_pin();
  color([0.16, 0.66, 0.66]) translate([26.4, 20.85, 56.75]) rotate([90, 0, 0]) pin_washer();
  color([0.85, 0.48, 0.18]) translate([26.4, 27.1, 56.75]) rotate([90, 0, 0]) lock_nut();
  color([0.55, 0.60, 0.65]) translate([-36, -19.6, 10.25]) rotate([0, 0, 0]) guide_bush_a();
  color([0.75, 0.30, 0.55]) translate([-36, 19.6, 10.25]) rotate([0, 0, 0]) guide_bush_b();
}

assembly();
